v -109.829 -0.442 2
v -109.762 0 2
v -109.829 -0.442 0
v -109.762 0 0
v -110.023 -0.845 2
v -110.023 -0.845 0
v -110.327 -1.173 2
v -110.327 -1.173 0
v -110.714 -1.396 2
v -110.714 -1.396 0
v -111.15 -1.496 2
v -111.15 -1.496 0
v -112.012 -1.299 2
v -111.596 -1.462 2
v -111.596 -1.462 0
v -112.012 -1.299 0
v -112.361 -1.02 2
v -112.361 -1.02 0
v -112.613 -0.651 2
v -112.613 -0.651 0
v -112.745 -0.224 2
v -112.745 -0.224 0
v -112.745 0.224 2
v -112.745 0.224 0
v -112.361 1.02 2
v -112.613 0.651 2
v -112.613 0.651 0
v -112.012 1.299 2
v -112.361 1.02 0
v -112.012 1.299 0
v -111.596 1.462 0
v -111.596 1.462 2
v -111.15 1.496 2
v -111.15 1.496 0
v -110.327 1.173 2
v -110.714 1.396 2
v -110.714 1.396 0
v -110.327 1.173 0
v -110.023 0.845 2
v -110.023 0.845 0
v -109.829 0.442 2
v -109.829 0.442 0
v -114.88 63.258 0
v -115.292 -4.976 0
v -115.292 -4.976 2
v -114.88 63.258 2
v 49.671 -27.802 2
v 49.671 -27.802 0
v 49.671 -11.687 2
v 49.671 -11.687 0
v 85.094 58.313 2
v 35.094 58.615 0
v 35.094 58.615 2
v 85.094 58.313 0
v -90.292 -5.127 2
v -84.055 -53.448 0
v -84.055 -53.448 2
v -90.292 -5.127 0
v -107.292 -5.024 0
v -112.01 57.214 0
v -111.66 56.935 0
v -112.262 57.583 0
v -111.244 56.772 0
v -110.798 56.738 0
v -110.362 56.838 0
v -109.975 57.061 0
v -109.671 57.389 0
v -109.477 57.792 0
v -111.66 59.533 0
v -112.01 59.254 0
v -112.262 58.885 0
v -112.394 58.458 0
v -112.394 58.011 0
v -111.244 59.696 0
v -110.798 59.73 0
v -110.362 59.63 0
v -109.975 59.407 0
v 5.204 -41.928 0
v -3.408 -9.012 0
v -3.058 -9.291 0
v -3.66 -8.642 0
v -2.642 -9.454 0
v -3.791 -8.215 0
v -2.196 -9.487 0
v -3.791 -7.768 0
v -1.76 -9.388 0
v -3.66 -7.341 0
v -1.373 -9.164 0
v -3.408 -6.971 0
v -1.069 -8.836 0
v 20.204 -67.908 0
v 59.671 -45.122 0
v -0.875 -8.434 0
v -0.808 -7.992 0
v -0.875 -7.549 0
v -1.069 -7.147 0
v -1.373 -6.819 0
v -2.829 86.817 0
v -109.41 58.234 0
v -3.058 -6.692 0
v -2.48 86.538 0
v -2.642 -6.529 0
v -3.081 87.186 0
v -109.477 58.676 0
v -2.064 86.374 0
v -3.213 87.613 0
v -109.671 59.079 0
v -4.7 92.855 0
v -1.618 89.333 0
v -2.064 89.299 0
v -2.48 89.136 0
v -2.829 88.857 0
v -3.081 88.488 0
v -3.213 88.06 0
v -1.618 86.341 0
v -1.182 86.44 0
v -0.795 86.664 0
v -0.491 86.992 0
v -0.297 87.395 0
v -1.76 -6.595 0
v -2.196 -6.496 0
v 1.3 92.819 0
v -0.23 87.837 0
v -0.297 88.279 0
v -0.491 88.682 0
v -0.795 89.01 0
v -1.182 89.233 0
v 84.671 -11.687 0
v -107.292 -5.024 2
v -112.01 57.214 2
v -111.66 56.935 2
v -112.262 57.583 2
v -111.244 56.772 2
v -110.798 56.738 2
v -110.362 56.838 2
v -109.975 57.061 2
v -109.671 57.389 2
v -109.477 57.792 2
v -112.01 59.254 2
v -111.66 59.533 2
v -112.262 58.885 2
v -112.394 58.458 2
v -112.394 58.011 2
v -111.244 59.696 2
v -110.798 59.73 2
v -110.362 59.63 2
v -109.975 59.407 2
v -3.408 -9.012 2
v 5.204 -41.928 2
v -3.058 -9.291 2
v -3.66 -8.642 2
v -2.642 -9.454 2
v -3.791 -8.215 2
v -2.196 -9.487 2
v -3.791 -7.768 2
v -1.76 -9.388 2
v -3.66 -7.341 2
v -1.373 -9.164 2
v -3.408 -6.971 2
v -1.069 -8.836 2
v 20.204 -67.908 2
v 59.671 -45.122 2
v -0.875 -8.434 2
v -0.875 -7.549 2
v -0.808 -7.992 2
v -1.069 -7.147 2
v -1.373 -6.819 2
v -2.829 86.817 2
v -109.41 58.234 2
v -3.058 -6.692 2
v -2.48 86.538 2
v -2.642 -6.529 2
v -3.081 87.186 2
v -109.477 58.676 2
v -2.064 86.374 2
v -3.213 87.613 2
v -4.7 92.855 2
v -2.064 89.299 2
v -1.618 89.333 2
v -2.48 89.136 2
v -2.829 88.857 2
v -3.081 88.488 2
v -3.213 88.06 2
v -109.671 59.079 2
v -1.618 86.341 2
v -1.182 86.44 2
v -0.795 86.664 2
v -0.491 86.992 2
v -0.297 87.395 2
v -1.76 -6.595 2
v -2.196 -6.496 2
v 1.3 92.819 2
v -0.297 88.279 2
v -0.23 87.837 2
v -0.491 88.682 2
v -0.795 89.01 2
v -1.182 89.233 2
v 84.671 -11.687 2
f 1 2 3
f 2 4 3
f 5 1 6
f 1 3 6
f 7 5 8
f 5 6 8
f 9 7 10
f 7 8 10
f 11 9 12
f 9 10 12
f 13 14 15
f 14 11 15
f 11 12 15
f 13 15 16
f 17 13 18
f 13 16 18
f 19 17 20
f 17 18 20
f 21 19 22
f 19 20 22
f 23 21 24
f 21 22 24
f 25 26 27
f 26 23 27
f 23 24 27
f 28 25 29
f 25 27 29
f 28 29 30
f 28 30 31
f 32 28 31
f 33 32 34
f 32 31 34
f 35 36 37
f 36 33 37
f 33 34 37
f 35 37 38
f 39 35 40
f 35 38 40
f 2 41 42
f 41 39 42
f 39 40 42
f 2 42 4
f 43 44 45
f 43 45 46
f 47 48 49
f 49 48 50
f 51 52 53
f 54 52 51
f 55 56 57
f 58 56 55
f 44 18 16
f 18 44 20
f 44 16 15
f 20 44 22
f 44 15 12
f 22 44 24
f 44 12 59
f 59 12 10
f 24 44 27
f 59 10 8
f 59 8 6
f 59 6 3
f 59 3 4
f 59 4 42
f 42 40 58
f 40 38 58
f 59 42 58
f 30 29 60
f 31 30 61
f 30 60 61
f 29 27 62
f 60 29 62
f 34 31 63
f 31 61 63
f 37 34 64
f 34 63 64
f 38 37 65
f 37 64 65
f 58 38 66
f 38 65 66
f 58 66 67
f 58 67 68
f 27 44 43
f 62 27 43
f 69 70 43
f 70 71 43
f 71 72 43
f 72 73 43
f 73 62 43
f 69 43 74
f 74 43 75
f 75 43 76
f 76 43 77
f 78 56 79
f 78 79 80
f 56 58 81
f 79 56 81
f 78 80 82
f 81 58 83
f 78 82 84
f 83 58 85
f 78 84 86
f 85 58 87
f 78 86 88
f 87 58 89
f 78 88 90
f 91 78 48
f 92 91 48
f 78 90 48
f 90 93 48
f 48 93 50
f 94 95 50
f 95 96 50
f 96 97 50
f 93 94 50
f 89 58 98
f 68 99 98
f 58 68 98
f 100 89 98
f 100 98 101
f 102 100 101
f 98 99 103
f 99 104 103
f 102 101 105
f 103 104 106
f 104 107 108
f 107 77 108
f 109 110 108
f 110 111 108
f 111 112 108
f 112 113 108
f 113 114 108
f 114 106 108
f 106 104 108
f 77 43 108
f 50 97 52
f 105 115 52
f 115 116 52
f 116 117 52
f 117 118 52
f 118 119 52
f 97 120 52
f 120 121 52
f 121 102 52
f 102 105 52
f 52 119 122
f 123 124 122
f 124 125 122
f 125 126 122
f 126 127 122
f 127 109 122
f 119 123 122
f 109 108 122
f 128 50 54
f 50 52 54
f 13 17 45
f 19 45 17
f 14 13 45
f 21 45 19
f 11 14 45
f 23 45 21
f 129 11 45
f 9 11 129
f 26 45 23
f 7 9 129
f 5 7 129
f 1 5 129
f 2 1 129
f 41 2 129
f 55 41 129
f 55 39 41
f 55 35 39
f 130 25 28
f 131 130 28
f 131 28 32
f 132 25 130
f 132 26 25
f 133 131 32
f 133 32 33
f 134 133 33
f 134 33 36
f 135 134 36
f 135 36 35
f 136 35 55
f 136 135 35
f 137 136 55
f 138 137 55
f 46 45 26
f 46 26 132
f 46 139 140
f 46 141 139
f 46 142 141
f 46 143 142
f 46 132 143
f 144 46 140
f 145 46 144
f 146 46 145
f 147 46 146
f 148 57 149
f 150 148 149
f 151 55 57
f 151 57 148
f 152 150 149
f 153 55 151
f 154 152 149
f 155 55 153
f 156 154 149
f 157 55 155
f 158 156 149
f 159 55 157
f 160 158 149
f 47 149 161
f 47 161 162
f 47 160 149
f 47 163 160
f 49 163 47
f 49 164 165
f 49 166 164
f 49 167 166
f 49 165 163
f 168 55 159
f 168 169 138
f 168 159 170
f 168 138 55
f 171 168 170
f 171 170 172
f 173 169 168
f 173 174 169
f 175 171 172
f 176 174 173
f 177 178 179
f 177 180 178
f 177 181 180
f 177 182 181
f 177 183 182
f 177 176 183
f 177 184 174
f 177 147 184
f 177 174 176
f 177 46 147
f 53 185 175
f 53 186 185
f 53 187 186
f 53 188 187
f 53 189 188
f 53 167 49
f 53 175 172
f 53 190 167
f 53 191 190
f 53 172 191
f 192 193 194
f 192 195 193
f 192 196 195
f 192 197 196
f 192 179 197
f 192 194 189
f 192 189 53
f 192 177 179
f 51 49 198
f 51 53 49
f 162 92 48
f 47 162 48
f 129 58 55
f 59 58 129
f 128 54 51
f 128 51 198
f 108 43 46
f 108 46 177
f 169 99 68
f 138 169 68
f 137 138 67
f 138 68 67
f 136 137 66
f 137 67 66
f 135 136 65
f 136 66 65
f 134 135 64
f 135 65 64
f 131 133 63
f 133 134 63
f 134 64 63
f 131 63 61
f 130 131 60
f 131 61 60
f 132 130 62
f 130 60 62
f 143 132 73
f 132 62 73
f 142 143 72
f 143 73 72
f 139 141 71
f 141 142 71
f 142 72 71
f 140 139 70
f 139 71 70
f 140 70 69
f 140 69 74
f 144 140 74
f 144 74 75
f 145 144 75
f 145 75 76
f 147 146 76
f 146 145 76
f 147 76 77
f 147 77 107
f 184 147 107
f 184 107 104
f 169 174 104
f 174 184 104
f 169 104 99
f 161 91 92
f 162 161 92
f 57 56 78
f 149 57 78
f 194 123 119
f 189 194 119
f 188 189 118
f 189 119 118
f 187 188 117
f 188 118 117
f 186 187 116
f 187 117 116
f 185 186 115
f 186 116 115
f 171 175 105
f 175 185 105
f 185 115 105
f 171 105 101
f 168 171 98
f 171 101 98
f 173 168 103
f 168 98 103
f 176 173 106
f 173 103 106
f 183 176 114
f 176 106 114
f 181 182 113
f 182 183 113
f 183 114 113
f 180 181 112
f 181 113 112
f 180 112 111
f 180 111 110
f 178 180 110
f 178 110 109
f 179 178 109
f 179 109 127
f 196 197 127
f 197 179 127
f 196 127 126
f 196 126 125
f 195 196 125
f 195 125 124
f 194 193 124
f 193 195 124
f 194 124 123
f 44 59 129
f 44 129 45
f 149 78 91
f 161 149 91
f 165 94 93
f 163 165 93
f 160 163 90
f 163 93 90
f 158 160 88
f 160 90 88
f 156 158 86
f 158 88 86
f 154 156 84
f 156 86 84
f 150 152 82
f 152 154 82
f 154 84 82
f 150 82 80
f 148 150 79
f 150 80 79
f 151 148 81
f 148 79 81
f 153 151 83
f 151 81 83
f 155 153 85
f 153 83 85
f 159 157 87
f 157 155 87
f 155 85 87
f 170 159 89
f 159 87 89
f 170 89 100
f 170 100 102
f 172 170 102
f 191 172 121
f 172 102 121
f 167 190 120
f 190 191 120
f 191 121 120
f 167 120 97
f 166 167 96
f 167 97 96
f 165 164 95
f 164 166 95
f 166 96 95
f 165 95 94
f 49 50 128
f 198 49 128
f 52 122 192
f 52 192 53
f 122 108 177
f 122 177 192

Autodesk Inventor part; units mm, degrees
ref_plane "YZ Plane" through (0, 0, 0) normal (1, 0, 0) x (0, 1, 0)
ref_plane "XZ Plane" through (0, 0, 0) normal (0, 1, 0) x (-1, 0, 0)
ref_plane "XY Plane" through (0, 0, 0) normal (0, 0, 1) x (1, 0, 0)
sketch "スケッチ1" plane through (0, 0, 0) normal (0, 0, 1) x (1, 0, 0)
  line L0 (-106.8804, 63.2098) -> (-114.8803, 63.2581) projected
  line L1 (-107.2922, -5.024) -> (-115.292, -4.9758) projected
  line L2 (-4.6996, 92.8548) -> (1.3002, 92.8186) projected
  line L3 (-5.3383, -12.9733) -> (0.6616, -13.0095) projected
  line L4 (-79.7382, 110.3105) -> (1.3027, 93.2276) projected
  line L5 (-88.2817, 72.7187) -> (-79.7382, 110.3105) projected
  line L6 (-84.055, -53.4485) -> (5.2045, -41.9275)
  line L7 (49.6711, -27.8017) -> (49.6711, -11.6868)
  line L8 (49.6711, -11.6868) -> (84.6711, -11.6868)
  line L9 (5.2045, -41.9275) -> (20.2045, -67.9083)
  line L10 (20.2045, -67.9083) -> (59.6711, -45.1223)
  line L11 (59.6711, -45.1223) -> (49.6711, -27.8017)
  line L12 (-84.055, -53.4485) -> (-90.292, -5.1266)
  circle A0 centre (-111.2619, 0) radius 1.5 projected
  circle A1 centre (-110.9105, 58.2341) radius 1.5 projected
  line L13 (-115.292, -4.9758) -> (-114.8803, 63.2581) projected
  line L14 (-106.8804, 63.2098) -> (-114.8803, 63.2581) projected
  line L15 (-106.8804, 63.2098) -> (-107.2922, -5.024) projected
  line L16 (-107.2922, -5.024) -> (-115.292, -4.9758) projected
  line L17 (-90.292, -5.1266) -> (-115.292, -4.9758)
  line L18 (-115.292, -4.9758) -> (-114.8803, 63.2581)
  circle A2 centre (-1.7299, 87.8368) radius 1.5 projected
  circle A3 centre (-2.3082, -7.9915) radius 1.5 projected
  line L19 (1.3002, 92.8186) -> (0.6616, -13.0095) projected
  line L20 (-5.3383, -12.9733) -> (0.6616, -13.0095) projected
  line L21 (-5.3383, -12.9733) -> (-4.6996, 92.8548) projected
  line L22 (-4.6996, 92.8548) -> (1.3002, 92.8186) projected
  line L23 (-114.8803, 63.2581) -> (-4.6996, 92.8548)
  line L24 (1.3002, 92.8186) -> (-4.6996, 92.8548)
  line L25 (1.3002, 92.8186) -> (35.0935, 58.6149)
  line L26 (35.0935, 58.6149) -> (85.0935, 58.3132)
  line L27 (85.0935, 58.3132) -> (84.6711, -11.6868)
  line L28 (-91.5437, -34.2492) -> (2.6068, -22.0969) projected
  point P0 (0, 0)
  dimension "d25" = 35
  dimension "d27" = 90
  dimension "d29" = 20
  dimension "d30" = 150
  dimension "d31" = 30
  dimension "d60" = 25
  dimension "d61" = 20
  dimension "d62" = 135
  dimension "d63" = 200
  dimension "d64" = 50
  dimension "d65" = 70
extrude "プレート2" add sketch "スケッチ1" along normal blind 2
equation "\"d6\" = Thickness"
equation "\"BendRadius\" = Thickness"
equation "\"BendReliefWidth\" = Thickness"
equation "\"BendReliefDepth\" = 0.5 * Thickness"
equation "\"CornerReliefSize\" = 4 * Thickness"
equation "\"MinimumRemnant\" = 2 * Thickness"
equation "\"TransitionRadius\" = BendRadius"
equation "\"JacobiRadiusSize\" = Thickness"
equation "\"GapSize\" = Thickness"
equation "\"Thickness\" = 2"
properties part number "baseframe" material "アルミニウム 6061"
